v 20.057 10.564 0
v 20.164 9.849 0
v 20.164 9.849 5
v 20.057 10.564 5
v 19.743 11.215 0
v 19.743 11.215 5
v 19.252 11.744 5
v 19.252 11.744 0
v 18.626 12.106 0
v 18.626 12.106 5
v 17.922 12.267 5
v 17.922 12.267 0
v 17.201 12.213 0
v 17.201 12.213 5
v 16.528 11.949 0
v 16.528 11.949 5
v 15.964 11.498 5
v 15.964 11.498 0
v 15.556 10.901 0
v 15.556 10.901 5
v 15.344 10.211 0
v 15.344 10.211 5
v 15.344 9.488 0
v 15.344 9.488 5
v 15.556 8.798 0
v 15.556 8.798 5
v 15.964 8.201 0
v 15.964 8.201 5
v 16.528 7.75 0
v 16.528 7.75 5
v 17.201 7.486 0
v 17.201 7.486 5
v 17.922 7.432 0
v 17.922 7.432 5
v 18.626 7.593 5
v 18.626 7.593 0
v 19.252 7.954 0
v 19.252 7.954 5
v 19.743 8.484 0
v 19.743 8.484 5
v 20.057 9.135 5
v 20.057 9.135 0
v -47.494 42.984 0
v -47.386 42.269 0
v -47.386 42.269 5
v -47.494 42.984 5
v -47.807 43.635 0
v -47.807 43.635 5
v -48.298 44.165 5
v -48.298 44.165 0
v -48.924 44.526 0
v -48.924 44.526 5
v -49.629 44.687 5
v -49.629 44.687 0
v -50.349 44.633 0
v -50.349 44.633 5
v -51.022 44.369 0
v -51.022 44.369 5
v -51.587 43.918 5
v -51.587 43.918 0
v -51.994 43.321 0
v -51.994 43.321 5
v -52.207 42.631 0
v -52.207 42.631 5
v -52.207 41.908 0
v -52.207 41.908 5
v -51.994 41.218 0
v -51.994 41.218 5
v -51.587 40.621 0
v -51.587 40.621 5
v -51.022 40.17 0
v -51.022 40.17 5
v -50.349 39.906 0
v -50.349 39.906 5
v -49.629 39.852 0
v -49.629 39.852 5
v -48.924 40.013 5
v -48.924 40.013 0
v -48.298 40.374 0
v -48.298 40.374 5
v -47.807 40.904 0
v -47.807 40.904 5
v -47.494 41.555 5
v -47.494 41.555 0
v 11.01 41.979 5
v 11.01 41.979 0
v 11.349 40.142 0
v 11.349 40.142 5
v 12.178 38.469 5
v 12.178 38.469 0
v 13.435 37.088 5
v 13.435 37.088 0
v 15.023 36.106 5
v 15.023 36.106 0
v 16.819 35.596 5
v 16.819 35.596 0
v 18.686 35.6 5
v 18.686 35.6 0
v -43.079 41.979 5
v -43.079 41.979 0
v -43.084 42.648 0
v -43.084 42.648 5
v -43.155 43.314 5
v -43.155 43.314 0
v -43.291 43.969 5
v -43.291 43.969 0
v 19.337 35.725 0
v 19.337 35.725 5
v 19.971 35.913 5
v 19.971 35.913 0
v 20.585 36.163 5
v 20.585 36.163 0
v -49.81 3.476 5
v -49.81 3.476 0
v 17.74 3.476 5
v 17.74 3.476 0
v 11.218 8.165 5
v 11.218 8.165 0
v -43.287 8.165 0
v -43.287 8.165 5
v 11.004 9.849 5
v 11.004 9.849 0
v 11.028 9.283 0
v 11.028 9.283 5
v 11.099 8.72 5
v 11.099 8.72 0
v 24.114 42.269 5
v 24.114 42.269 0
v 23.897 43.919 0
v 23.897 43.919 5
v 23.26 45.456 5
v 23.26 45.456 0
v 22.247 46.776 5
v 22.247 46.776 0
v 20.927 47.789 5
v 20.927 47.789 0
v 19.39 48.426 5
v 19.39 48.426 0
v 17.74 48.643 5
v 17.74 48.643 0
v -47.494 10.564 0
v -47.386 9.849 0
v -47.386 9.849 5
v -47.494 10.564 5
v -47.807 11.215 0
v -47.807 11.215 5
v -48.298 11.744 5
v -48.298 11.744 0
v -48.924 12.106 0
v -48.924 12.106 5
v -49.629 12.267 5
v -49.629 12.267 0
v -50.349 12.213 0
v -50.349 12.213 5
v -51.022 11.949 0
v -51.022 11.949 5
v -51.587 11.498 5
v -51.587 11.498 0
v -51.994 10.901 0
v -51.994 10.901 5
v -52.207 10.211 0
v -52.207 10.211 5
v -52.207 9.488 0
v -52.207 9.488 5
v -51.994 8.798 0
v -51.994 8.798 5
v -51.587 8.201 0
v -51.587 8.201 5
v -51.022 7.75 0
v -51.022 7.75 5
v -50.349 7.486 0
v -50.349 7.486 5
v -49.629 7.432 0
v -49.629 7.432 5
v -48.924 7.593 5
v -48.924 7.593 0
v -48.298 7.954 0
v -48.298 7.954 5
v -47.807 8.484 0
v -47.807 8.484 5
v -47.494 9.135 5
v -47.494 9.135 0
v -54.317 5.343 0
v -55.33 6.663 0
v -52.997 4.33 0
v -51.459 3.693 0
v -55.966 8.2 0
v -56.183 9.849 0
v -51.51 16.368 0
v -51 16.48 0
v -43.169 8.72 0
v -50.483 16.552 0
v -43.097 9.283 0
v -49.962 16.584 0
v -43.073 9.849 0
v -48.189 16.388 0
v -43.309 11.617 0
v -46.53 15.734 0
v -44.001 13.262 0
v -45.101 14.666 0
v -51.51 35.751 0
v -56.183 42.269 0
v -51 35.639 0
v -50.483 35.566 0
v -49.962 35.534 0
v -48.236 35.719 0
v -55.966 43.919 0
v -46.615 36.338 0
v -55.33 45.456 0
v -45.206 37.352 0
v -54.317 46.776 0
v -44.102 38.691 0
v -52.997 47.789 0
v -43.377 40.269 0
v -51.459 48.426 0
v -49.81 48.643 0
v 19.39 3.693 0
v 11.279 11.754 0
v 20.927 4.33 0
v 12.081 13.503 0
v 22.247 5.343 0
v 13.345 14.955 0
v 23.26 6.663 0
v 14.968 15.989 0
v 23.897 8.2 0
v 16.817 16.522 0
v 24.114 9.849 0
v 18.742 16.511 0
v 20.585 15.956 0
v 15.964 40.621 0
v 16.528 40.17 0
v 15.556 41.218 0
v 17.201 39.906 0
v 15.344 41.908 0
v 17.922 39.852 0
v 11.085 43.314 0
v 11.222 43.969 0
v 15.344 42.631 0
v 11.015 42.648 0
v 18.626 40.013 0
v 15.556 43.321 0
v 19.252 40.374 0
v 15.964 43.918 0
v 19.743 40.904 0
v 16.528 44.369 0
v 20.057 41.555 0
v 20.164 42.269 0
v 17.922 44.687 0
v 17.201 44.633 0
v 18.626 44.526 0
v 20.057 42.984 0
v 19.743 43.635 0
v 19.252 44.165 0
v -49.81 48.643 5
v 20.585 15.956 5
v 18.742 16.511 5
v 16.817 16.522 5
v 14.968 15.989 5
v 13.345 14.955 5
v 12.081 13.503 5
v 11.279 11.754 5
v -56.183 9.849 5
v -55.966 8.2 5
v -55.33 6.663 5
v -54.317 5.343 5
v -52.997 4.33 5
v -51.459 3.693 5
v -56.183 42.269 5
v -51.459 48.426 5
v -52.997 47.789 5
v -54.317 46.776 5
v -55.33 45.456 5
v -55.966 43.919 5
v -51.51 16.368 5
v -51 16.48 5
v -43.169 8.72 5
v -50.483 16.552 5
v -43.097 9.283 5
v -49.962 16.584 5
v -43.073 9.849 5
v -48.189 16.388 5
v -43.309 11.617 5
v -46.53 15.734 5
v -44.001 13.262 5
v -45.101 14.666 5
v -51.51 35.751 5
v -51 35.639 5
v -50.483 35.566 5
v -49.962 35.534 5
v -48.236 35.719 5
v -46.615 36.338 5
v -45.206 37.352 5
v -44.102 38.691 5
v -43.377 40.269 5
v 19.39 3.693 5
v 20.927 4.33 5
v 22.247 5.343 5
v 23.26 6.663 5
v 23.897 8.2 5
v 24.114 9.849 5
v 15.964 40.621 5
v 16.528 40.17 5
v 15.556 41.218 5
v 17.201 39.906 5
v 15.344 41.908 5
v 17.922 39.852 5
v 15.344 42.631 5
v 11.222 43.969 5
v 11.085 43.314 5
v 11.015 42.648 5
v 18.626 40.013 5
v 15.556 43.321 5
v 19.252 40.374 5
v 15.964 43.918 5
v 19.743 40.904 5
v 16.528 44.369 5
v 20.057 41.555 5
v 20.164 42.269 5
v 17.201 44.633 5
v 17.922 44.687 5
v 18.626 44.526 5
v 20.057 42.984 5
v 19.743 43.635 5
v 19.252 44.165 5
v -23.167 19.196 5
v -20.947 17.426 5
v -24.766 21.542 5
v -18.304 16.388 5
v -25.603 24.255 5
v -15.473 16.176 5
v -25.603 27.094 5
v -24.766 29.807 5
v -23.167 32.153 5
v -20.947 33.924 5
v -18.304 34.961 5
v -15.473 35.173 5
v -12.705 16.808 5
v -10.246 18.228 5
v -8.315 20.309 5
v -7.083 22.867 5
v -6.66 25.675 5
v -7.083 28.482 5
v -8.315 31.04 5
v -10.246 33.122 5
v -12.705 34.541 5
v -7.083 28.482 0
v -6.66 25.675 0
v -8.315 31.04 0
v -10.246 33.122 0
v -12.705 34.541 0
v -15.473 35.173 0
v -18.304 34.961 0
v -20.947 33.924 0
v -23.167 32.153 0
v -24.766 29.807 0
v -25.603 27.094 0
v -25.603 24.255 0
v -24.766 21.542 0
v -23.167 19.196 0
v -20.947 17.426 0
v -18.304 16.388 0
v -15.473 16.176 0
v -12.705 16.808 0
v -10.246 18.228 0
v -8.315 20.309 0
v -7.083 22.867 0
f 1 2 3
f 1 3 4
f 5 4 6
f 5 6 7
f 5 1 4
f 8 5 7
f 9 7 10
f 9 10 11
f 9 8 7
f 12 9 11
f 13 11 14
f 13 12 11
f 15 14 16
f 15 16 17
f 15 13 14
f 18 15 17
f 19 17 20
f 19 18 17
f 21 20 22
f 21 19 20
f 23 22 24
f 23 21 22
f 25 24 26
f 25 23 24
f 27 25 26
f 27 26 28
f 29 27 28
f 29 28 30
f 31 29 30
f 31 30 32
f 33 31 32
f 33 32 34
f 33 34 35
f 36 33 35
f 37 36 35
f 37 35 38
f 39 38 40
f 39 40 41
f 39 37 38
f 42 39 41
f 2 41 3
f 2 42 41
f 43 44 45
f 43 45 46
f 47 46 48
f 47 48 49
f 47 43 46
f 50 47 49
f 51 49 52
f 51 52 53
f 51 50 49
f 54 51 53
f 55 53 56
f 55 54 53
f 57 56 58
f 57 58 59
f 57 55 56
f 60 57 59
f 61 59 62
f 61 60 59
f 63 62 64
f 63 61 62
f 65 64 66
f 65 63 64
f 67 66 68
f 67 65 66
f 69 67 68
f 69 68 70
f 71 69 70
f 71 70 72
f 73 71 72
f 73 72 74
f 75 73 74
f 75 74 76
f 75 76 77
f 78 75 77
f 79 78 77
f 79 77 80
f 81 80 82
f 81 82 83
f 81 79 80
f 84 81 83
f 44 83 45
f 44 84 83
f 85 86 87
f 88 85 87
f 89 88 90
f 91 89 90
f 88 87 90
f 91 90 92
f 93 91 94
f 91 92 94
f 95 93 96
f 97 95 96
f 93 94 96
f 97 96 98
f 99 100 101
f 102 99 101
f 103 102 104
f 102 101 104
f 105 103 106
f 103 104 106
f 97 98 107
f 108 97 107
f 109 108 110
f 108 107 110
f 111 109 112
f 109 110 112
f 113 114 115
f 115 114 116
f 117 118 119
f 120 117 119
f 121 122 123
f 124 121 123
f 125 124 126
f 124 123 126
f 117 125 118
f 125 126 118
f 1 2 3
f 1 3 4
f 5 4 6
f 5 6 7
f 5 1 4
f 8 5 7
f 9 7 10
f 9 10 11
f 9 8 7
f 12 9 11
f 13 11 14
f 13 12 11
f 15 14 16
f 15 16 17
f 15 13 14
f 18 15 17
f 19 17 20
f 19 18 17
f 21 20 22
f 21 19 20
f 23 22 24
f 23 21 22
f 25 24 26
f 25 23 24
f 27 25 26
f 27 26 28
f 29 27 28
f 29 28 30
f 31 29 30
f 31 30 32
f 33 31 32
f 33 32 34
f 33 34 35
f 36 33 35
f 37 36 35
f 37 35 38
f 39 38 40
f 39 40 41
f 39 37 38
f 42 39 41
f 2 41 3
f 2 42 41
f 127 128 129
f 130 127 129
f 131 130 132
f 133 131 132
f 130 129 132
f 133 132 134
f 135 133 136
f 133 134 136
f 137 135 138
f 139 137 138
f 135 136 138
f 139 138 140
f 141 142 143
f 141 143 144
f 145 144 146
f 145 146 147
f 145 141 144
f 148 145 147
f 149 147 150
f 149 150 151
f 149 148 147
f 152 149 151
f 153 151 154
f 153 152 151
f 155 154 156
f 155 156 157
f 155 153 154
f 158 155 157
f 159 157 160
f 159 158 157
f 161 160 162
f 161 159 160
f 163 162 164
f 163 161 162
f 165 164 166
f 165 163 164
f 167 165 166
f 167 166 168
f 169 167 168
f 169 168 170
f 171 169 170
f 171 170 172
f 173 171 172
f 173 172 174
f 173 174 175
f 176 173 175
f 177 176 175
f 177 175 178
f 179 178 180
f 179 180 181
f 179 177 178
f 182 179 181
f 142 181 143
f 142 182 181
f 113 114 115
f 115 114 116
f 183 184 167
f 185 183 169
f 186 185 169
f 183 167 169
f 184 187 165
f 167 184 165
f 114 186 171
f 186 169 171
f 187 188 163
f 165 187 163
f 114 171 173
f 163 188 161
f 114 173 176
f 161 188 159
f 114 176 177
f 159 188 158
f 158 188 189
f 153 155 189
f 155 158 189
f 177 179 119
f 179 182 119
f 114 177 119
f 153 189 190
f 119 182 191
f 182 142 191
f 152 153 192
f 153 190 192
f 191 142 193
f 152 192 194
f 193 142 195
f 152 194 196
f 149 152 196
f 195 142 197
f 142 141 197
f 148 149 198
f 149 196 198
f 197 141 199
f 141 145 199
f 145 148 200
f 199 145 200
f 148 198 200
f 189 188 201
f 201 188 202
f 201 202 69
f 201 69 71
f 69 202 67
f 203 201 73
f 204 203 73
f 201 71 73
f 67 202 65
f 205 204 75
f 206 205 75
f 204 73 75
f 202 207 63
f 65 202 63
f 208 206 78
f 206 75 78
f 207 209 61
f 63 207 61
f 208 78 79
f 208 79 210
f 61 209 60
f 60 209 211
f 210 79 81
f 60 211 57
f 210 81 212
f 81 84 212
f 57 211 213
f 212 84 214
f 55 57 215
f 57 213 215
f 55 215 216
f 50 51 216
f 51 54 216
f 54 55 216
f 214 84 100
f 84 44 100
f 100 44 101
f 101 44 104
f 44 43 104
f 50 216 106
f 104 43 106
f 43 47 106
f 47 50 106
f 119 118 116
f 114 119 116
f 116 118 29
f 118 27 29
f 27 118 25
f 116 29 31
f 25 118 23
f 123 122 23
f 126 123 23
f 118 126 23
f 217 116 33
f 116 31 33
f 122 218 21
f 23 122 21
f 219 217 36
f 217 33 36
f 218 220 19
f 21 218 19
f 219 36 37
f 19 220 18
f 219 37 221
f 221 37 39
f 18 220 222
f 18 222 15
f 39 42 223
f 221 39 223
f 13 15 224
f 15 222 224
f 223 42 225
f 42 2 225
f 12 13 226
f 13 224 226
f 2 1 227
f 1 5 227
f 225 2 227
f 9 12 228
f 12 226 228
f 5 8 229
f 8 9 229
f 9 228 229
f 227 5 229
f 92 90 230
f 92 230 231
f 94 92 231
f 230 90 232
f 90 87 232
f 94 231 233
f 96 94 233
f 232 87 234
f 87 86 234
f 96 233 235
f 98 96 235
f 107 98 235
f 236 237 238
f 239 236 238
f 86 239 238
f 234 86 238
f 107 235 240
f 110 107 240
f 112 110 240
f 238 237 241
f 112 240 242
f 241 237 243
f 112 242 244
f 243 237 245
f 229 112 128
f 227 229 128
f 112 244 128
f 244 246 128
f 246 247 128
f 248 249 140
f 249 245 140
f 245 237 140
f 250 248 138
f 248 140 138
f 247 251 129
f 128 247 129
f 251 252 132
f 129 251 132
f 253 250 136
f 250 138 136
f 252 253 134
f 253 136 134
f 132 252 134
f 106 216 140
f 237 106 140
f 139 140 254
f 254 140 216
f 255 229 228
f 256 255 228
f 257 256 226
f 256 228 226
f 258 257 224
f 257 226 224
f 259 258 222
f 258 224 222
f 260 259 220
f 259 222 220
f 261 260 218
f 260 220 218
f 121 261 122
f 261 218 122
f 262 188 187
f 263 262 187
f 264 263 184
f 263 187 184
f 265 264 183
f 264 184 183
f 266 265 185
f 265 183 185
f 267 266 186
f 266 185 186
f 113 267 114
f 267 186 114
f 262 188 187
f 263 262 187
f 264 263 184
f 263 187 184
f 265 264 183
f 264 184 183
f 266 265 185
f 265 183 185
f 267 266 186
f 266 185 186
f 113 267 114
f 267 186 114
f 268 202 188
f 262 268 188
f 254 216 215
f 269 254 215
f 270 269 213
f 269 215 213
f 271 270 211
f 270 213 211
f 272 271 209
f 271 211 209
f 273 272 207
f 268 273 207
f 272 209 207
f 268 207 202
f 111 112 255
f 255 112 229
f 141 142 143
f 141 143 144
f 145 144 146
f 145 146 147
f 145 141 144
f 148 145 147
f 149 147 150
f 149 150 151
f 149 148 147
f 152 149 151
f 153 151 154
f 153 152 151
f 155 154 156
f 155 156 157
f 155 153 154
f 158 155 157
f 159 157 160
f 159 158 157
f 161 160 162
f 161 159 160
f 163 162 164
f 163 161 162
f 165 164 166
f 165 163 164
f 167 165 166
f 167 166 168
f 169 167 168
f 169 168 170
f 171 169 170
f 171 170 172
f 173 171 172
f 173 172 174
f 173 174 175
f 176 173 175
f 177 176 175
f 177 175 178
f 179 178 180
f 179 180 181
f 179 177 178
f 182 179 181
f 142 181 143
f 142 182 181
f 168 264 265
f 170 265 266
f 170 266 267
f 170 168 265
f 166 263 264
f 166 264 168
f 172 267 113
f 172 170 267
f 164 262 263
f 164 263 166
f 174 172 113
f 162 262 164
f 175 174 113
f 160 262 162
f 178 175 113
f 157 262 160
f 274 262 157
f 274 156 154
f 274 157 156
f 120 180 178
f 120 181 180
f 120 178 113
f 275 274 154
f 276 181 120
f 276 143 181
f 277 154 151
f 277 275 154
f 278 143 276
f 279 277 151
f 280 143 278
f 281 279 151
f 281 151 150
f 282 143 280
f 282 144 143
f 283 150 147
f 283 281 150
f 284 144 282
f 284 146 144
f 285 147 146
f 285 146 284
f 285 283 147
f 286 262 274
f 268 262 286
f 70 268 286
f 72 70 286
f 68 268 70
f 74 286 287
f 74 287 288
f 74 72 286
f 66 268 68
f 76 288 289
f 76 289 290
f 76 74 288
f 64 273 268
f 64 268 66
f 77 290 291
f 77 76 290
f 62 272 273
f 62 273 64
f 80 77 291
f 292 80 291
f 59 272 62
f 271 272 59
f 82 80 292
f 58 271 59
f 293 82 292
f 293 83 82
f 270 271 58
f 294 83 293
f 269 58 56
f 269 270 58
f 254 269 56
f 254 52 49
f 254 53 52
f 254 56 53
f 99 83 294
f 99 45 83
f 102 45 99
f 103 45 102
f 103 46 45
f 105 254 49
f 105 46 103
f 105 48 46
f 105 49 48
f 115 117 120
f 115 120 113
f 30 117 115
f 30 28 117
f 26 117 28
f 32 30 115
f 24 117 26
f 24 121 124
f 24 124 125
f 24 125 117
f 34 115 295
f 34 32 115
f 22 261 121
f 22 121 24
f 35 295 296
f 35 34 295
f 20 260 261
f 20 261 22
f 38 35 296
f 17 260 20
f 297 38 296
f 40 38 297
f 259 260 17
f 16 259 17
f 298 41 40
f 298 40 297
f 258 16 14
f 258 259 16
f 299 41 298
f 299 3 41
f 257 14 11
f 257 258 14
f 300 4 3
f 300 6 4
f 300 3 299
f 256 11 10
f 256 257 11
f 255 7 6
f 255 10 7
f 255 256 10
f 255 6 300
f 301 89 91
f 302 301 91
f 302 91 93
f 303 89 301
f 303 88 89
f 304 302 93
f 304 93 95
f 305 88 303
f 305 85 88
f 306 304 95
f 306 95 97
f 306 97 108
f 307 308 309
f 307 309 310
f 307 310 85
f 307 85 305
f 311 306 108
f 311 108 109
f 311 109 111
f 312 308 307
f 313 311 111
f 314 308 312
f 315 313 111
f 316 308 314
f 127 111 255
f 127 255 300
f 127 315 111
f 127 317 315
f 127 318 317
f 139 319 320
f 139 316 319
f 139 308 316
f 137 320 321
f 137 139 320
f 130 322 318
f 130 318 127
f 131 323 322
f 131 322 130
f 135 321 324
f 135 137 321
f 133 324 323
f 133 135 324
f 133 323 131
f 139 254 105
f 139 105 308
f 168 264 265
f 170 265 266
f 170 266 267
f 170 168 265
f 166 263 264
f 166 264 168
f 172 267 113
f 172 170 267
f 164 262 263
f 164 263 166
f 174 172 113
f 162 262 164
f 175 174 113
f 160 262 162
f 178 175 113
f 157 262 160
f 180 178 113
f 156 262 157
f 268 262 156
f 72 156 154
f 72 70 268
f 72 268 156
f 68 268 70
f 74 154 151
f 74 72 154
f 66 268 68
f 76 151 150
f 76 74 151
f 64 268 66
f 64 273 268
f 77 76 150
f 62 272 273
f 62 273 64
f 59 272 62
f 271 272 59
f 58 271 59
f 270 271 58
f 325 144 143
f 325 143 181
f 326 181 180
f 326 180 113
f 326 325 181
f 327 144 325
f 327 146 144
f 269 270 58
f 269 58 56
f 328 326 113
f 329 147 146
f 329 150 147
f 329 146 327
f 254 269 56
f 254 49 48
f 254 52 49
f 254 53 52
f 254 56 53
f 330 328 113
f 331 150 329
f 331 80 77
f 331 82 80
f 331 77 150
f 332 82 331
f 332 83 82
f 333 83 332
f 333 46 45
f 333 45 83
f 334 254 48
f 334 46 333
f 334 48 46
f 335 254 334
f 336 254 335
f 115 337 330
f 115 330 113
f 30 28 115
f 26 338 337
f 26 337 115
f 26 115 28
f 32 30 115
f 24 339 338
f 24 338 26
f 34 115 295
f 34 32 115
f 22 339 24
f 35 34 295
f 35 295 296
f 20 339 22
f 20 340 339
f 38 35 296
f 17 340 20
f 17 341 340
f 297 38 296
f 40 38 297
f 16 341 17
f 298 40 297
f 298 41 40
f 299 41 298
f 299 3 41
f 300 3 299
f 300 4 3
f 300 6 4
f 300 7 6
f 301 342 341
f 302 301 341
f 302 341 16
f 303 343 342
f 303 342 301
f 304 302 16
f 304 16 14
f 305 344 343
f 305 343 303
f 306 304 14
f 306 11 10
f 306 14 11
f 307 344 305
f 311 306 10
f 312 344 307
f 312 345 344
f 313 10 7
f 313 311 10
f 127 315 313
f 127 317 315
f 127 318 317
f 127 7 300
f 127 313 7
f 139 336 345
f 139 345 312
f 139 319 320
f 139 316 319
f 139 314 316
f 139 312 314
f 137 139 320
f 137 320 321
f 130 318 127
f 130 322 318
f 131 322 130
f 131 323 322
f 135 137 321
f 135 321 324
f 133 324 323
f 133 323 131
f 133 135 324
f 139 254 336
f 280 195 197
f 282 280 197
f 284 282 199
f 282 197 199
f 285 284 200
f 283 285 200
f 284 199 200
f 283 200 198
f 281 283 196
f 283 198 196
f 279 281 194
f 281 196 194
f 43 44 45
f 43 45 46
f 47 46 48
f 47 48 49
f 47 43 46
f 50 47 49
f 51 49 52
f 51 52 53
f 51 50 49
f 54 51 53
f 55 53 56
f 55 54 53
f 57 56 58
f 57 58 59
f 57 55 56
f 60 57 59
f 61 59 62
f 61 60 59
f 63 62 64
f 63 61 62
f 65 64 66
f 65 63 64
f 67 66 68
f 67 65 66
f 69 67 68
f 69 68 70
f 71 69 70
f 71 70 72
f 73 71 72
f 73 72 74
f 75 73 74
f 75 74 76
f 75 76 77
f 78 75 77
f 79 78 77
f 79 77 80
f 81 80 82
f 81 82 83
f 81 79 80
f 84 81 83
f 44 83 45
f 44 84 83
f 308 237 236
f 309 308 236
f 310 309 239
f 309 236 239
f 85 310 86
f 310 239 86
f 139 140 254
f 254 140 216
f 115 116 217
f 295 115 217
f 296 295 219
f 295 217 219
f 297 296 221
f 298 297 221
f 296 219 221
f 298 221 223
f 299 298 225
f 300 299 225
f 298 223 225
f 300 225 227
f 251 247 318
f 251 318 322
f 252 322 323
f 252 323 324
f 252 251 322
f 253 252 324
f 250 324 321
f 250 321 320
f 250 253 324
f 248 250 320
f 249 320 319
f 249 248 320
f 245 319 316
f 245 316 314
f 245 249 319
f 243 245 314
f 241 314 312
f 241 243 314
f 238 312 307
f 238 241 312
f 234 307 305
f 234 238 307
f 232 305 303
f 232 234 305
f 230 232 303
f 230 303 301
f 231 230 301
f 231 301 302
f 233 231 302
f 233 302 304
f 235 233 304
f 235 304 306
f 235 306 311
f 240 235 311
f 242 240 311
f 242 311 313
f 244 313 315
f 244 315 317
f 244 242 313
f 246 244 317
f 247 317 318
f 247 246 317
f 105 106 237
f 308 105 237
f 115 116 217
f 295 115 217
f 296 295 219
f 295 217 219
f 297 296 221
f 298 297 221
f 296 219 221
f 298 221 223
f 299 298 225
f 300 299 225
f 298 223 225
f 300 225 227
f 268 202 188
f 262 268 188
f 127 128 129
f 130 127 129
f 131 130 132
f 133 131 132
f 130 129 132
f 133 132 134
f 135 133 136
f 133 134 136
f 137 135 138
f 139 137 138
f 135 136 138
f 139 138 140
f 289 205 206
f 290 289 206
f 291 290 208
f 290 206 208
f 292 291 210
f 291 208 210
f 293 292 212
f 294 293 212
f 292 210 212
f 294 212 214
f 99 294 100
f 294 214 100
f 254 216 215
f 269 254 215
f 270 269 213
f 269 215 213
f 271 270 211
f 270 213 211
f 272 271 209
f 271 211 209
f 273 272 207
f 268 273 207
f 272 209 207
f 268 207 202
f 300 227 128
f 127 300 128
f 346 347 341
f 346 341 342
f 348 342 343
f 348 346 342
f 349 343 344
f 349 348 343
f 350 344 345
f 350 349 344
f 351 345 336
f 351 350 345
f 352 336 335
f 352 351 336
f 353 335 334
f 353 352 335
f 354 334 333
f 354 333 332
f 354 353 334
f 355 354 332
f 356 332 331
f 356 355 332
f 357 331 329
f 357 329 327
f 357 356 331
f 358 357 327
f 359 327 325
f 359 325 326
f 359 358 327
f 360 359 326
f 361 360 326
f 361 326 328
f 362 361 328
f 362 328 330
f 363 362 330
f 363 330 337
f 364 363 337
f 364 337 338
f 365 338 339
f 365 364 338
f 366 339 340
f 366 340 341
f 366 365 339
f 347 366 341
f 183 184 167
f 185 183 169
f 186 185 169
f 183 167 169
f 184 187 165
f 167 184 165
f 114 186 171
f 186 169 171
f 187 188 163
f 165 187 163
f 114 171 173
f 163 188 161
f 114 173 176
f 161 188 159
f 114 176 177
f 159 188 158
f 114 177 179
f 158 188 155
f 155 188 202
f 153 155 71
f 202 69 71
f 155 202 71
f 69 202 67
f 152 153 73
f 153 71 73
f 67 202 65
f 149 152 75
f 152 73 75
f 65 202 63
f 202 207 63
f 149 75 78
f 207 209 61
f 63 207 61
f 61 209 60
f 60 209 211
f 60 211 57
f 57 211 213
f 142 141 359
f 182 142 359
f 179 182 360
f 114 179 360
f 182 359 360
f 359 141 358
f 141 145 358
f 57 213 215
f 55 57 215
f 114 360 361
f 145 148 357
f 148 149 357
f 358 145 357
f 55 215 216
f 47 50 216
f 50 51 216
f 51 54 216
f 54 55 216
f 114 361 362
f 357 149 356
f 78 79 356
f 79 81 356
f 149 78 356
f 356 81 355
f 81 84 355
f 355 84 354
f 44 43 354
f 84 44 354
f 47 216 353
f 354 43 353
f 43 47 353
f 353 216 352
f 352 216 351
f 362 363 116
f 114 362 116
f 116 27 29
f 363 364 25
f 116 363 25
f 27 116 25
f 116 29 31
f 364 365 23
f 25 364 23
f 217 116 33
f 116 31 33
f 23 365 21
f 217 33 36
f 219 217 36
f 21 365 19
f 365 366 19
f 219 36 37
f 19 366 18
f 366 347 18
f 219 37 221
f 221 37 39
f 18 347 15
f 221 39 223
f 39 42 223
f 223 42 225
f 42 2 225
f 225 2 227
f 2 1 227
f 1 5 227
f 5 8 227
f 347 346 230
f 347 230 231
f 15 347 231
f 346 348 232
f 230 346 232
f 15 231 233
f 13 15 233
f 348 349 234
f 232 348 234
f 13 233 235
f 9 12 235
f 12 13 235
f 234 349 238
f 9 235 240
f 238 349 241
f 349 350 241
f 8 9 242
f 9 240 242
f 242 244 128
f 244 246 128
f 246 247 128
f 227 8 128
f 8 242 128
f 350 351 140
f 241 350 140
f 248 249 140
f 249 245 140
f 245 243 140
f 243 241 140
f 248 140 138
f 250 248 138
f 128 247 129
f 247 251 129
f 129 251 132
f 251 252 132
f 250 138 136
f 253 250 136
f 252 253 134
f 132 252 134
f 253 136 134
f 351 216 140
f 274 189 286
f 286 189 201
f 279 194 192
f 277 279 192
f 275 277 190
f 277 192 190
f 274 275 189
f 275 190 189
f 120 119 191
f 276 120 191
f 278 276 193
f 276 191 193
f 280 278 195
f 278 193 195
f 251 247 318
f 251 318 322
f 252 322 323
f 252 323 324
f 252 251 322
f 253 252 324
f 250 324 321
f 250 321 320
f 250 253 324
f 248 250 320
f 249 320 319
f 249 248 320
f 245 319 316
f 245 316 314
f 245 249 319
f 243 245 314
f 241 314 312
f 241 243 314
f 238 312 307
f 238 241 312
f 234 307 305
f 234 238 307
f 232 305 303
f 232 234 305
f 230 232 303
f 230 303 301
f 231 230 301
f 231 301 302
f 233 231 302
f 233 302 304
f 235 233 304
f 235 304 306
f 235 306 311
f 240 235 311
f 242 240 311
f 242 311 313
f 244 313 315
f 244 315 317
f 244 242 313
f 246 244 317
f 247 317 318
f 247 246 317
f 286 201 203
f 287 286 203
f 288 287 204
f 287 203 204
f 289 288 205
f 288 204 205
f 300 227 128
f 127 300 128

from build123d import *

# Parameters (mm, degrees)
F0_R     = 2.4239795943
F1_DEPTH = 5
F0_R_2   = 14.985
F0_R_3   = 13.105
F0_R_4   = 9.525
F2_DEPTH = 5


with BuildPart() as f1:
    # F0 (on Top) → F1 (new body)
    with BuildSketch(Plane.XY):
        with BuildLine():
            Line((17.7404159275, 48.6430391774), (-49.8098228694, 48.6430391774))
            ThreePointArc((-49.8098228694, 48.6430391774), (-54.3166463867, 46.7762517533), (-56.1834338108, 42.2694282359))
            Line((-56.1834338108, 42.2694282359), (-56.1834338108, 9.8493284865))
            ThreePointArc((-56.1834338108, 9.8493284865), (-54.3166463867, 5.3425049691), (-49.8098228694, 3.475717545))
            Line((-49.8098228694, 3.475717545), (17.7404159275, 3.475717545))
            ThreePointArc((17.7404159275, 3.475717545), (22.2472394449, 5.3425049691), (24.114026869, 9.8493284865))
            Line((24.114026869, 9.8493284865), (24.114026869, 42.2694282359))
            ThreePointArc((24.114026869, 42.2694282359), (22.2472394449, 46.7762517533), (17.7404159275, 48.6430391774))
        make_face()
        with Locations((-49.8098228694, 9.8493301855)):
            Circle(F0_R, mode=Mode.SUBTRACT)
        with Locations((17.7404159273, 9.8493284865)):
            Circle(F0_R, mode=Mode.SUBTRACT)
        with Locations((-49.8098201772, 42.2694282359)):
            Circle(F0_R, mode=Mode.SUBTRACT)
        with BuildLine():
            ThreePointArc((18.6863742083, 35.5996759781), (19.6563634016, 35.8111329866), (20.5847411662, 36.1628542221))
            Line((20.5847411662, 36.1628542221), (20.5847411662, 33.96608295))
            Line((20.5847411662, 33.96608295), (20.5847411662, 18.1526737723))
            Line((20.5847411662, 18.1526737723), (20.5847411662, 16.1657168497))
            Line((20.5847411662, 16.1657168497), (20.5847411662, 15.9559025003))
            ThreePointArc((20.5847411662, 15.9559025003), (14.119667658, 15.5300515231), (11.0039159275, 9.8493283582))
            ThreePointArc((11.0039159275, 9.8493283582), (11.0576244735, 9.0003699293), (11.2178936678, 8.1649485943))
            Line((11.2178936678, 8.1649485943), (9.1265553889, 8.1649485943))
            Line((9.1265553889, 8.1649485943), (-41.1959623307, 8.1649485943))
            Line((-41.1959623307, 8.1649485943), (-43.2873006096, 8.1649485943))
            ThreePointArc((-43.2873006096, 8.1649485943), (-43.1270314153, 9.0003699293), (-43.0733228694, 9.8493283582))
            ThreePointArc((-43.0733228694, 9.8493283582), (-45.1006810771, 14.6664246896), (-49.9624837875, 16.5840984821))
            ThreePointArc((-49.9624837875, 16.5840984821), (-50.7424459789, 16.5209584511), (-51.5098240912, 16.3677967188))
            Line((-51.5098240912, 16.3677967188), (-51.5098240912, 18.4601196723))
            Line((-51.5098240912, 18.4601196723), (-51.5098240912, 33.6587008899))
            Line((-51.5098240912, 33.6587008899), (-51.5098240912, 35.7507176035))
            ThreePointArc((-51.5098240912, 35.7507176035), (-50.7424455275, 35.5975613727), (-49.9624837875, 35.5344236251))
            ThreePointArc((-49.9624837875, 35.5344236251), (-45.2055520994, 37.3516763979), (-43.0793609271, 41.9787832503))
            ThreePointArc((-43.0793609271, 41.9787832503), (-43.1108817874, 42.9820156644), (-43.2911122152, 43.9694293742))
            Line((-43.2911122152, 43.9694293742), (-41.1990955068, 43.9694293742))
            Line((-41.1990955068, 43.9694293742), (9.1296247252, 43.9694293742))
            Line((9.1296247252, 43.9694293742), (11.2219476734, 43.9694293742))
            ThreePointArc((11.2219476734, 43.9694293742), (11.041710784, 42.982016231), (11.0101887588, 41.9787832503))
            ThreePointArc((11.0101887588, 41.9787832503), (13.4348736807, 37.0884304352), (18.6863742083, 35.5996759781))
        make_face(mode=Mode.SUBTRACT)
        with Locations((17.7404159273, 42.2694282359)):
            Circle(F0_R, mode=Mode.SUBTRACT)
    extrude(amount=F1_DEPTH)


with BuildPart() as f2:
    # F0 (on Top) → F2 (new body)
    with BuildSketch(Plane.XY):
        with BuildLine():
            Line((17.7404159275, 48.6430391774), (-49.8098228694, 48.6430391774))
            ThreePointArc((-49.8098228694, 48.6430391774), (-54.3166463867, 46.7762517533), (-56.1834338108, 42.2694282359))
            Line((-56.1834338108, 42.2694282359), (-56.1834338108, 9.8493284865))
            ThreePointArc((-56.1834338108, 9.8493284865), (-54.3166463867, 5.3425049691), (-49.8098228694, 3.475717545))
            Line((-49.8098228694, 3.475717545), (17.7404159275, 3.475717545))
            ThreePointArc((17.7404159275, 3.475717545), (22.2472394449, 5.3425049691), (24.114026869, 9.8493284865))
            Line((24.114026869, 9.8493284865), (24.114026869, 42.2694282359))
            ThreePointArc((24.114026869, 42.2694282359), (22.2472394449, 46.7762517533), (17.7404159275, 48.6430391774))
        make_face()
        with Locations((-49.8098228694, 9.8493301855)):
            Circle(F0_R, mode=Mode.SUBTRACT)
        with Locations((17.7404159273, 9.8493284865)):
            Circle(F0_R, mode=Mode.SUBTRACT)
        with Locations((-49.8098201772, 42.2694282359)):
            Circle(F0_R, mode=Mode.SUBTRACT)
        with BuildLine():
            ThreePointArc((18.6863742083, 35.5996759781), (19.6563634016, 35.8111329866), (20.5847411662, 36.1628542221))
            Line((20.5847411662, 36.1628542221), (20.5847411662, 33.96608295))
            Line((20.5847411662, 33.96608295), (20.5847411662, 18.1526737723))
            Line((20.5847411662, 18.1526737723), (20.5847411662, 16.1657168497))
            Line((20.5847411662, 16.1657168497), (20.5847411662, 15.9559025003))
            ThreePointArc((20.5847411662, 15.9559025003), (14.119667658, 15.5300515231), (11.0039159275, 9.8493283582))
            ThreePointArc((11.0039159275, 9.8493283582), (11.0576244735, 9.0003699293), (11.2178936678, 8.1649485943))
            Line((11.2178936678, 8.1649485943), (9.1265553889, 8.1649485943))
            Line((9.1265553889, 8.1649485943), (-41.1959623307, 8.1649485943))
            Line((-41.1959623307, 8.1649485943), (-43.2873006096, 8.1649485943))
            ThreePointArc((-43.2873006096, 8.1649485943), (-43.1270314153, 9.0003699293), (-43.0733228694, 9.8493283582))
            ThreePointArc((-43.0733228694, 9.8493283582), (-45.1006810771, 14.6664246896), (-49.9624837875, 16.5840984821))
            ThreePointArc((-49.9624837875, 16.5840984821), (-50.7424459789, 16.5209584511), (-51.5098240912, 16.3677967188))
            Line((-51.5098240912, 16.3677967188), (-51.5098240912, 18.4601196723))
            Line((-51.5098240912, 18.4601196723), (-51.5098240912, 33.6587008899))
            Line((-51.5098240912, 33.6587008899), (-51.5098240912, 35.7507176035))
            ThreePointArc((-51.5098240912, 35.7507176035), (-50.7424455275, 35.5975613727), (-49.9624837875, 35.5344236251))
            ThreePointArc((-49.9624837875, 35.5344236251), (-45.2055520994, 37.3516763979), (-43.0793609271, 41.9787832503))
            ThreePointArc((-43.0793609271, 41.9787832503), (-43.1108817874, 42.9820156644), (-43.2911122152, 43.9694293742))
            Line((-43.2911122152, 43.9694293742), (-41.1990955068, 43.9694293742))
            Line((-41.1990955068, 43.9694293742), (9.1296247252, 43.9694293742))
            Line((9.1296247252, 43.9694293742), (11.2219476734, 43.9694293742))
            ThreePointArc((11.2219476734, 43.9694293742), (11.041710784, 42.982016231), (11.0101887588, 41.9787832503))
            ThreePointArc((11.0101887588, 41.9787832503), (13.4348736807, 37.0884304352), (18.6863742083, 35.5996759781))
        make_face(mode=Mode.SUBTRACT)
        with Locations((17.7404159273, 42.2694282359)):
            Circle(F0_R, mode=Mode.SUBTRACT)
        with BuildLine():
            Line((18.7836135842, 18.5641129158), (18.6882003436, 33.5437515458))
            ThreePointArc((18.6882003436, 33.5437515458), (11.9877855185, 35.6404786677), (8.9682295129, 41.9787832503))
            Line((8.9682295129, 41.9787832503), (8.1356065594, 41.9787832503))
            Line((8.1356065594, 41.9787832503), (-41.03769912, 41.9787832503))
            ThreePointArc((-41.03769912, 41.9787832503), (-43.7623075869, 35.9084386517), (-49.9624837875, 33.4938186146))
            Line((-49.9624837875, 33.4938186146), (-49.9624837875, 18.6250007481))
            ThreePointArc((-49.9624837875, 18.6250007481), (-43.6577571493, 16.1093457689), (-41.0328228694, 9.8493283582))
            Line((-41.0328228694, 9.8493283582), (8.1356065594, 9.8493283582))
            Line((8.1356065594, 9.8493283582), (8.9634159275, 9.8493283582))
            ThreePointArc((8.9634159275, 9.8493283582), (11.9146291014, 16.4140780519), (18.7836135842, 18.5641129158))
        make_face()
        with Locations((-16.184706682, 25.6746851806)):
            Circle(F0_R_2, mode=Mode.SUBTRACT)
        with Locations((-16.184706682, 25.6746851806)):
            Circle(F0_R_2)
        with Locations((-16.184706682, 25.6746851806)):
            Circle(F0_R_3, mode=Mode.SUBTRACT)
        with Locations((-16.184706682, 25.6746851806)):
            Circle(F0_R_3)
        with Locations((-16.184706682, 25.6746851806)):
            Circle(F0_R_4, mode=Mode.SUBTRACT)
        with BuildLine():
            Line((8.1356065594, 41.9787832503), (8.9682295129, 41.9787832503))
            ThreePointArc((8.9682295129, 41.9787832503), (8.9921220536, 42.978711885), (9.1296247252, 43.9694293742))
            Line((9.1296247252, 43.9694293742), (-41.1990955068, 43.9694293742))
            ThreePointArc((-41.1990955068, 43.9694293742), (-41.0615918372, 42.9787119518), (-41.03769912, 41.9787832503))
            Line((-41.03769912, 41.9787832503), (8.1356065594, 41.9787832503))
        make_face()
        with BuildLine():
            ThreePointArc((9.1265553889, 8.1649485943), (9.0042960013, 9.003197507), (8.9634159275, 9.8493283582))
            Line((8.9634159275, 9.8493283582), (8.1356065594, 9.8493283582))
            Line((8.1356065594, 9.8493283582), (-41.0328228694, 9.8493283582))
            ThreePointArc((-41.0328228694, 9.8493283582), (-41.0737029431, 9.003197507), (-41.1959623307, 8.1649485943))
            Line((-41.1959623307, 8.1649485943), (9.1265553889, 8.1649485943))
        make_face()
        with BuildLine():
            Line((20.5847411662, 16.1657168497), (20.5847411662, 18.1526737723))
            ThreePointArc((20.5847411662, 18.1526737723), (19.6950333089, 18.4059165852), (18.7836135842, 18.5641129158))
            ThreePointArc((18.7836135842, 18.5641129158), (11.9146291014, 16.4140780519), (8.9634159275, 9.8493283582))
            Line((8.9634159275, 9.8493283582), (11.0039159275, 9.8493283582))
            ThreePointArc((11.0039159275, 9.8493283582), (14.119667658, 15.5300515231), (20.5847411662, 15.9559025003))
            Line((20.5847411662, 15.9559025003), (20.5847411662, 16.1657168497))
        make_face()
        with BuildLine():
            Line((20.5847411662, 18.1526737723), (20.5847411662, 33.96608295))
            ThreePointArc((20.5847411662, 33.96608295), (19.6481933942, 33.7022750251), (18.6882003436, 33.5437515458))
            Line((18.6882003436, 33.5437515458), (18.7836135842, 18.5641129158))
            ThreePointArc((18.7836135842, 18.5641129158), (19.6950333089, 18.4059165852), (20.5847411662, 18.1526737723))
        make_face()
        with BuildLine():
            Line((18.6863742083, 33.8304501925), (18.6863742083, 35.5996759781))
            ThreePointArc((18.6863742083, 35.5996759781), (13.4348736807, 37.0884304352), (11.0101887588, 41.9787832503))
            Line((11.0101887588, 41.9787832503), (8.9682295129, 41.9787832503))
            ThreePointArc((8.9682295129, 41.9787832503), (11.9877855185, 35.6404786677), (18.6882003436, 33.5437515458))
            Line((18.6882003436, 33.5437515458), (18.6863742083, 33.8304501925))
        make_face()
        with BuildLine():
            Line((-41.5897783577, 9.8493283582), (-41.0328228694, 9.8493283582))
            ThreePointArc((-41.0328228694, 9.8493283582), (-43.6577571493, 16.1093457689), (-49.9624837875, 18.6250007481))
            Line((-49.9624837875, 18.6250007481), (-49.9624837875, 18.4927576189))
            Line((-49.9624837875, 18.4927576189), (-49.9624837875, 16.5840984821))
            ThreePointArc((-49.9624837875, 16.5840984821), (-45.1006810771, 14.6664246896), (-43.0733228694, 9.8493283582))
            Line((-43.0733228694, 9.8493283582), (-41.5897783577, 9.8493283582))
        make_face()
        with BuildLine():
            ThreePointArc((-49.9624837875, 33.4938186146), (-43.7623075869, 35.9084386517), (-41.03769912, 41.9787832503))
            Line((-41.03769912, 41.9787832503), (-41.5897783577, 41.9787832503))
            Line((-41.5897783577, 41.9787832503), (-43.0793609271, 41.9787832503))
            ThreePointArc((-43.0793609271, 41.9787832503), (-45.2055520994, 37.3516763979), (-49.9624837875, 35.5344236251))
            Line((-49.9624837875, 35.5344236251), (-49.9624837875, 33.8304501925))
            Line((-49.9624837875, 33.8304501925), (-49.9624837875, 33.4938186146))
        make_face()
        with BuildLine():
            Line((-49.9624837875, 18.6250007481), (-49.9624837875, 33.4938186146))
            ThreePointArc((-49.9624837875, 33.4938186146), (-50.7398152308, 33.5419003047), (-51.5098240912, 33.6587008899))
            Line((-51.5098240912, 33.6587008899), (-51.5098240912, 18.4601196723))
            ThreePointArc((-51.5098240912, 18.4601196723), (-50.7398151777, 18.5769194087), (-49.9624837875, 18.6250007481))
        make_face()
        with BuildLine():
            Line((8.9682295129, 41.9787832503), (11.0101887588, 41.9787832503))
            ThreePointArc((11.0101887588, 41.9787832503), (11.041710784, 42.982016231), (11.2219476734, 43.9694293742))
            Line((11.2219476734, 43.9694293742), (9.1296247252, 43.9694293742))
            ThreePointArc((9.1296247252, 43.9694293742), (8.9921220536, 42.978711885), (8.9682295129, 41.9787832503))
        make_face()
        with BuildLine():
            ThreePointArc((-41.03769912, 41.9787832503), (-41.0615918372, 42.9787119518), (-41.1990955068, 43.9694293742))
            Line((-41.1990955068, 43.9694293742), (-43.2911122152, 43.9694293742))
            ThreePointArc((-43.2911122152, 43.9694293742), (-43.1108817874, 42.9820156644), (-43.0793609271, 41.9787832503))
            Line((-43.0793609271, 41.9787832503), (-41.5897783577, 41.9787832503))
            Line((-41.5897783577, 41.9787832503), (-41.03769912, 41.9787832503))
        make_face()
        with BuildLine():
            Line((20.5847411662, 33.96608295), (20.5847411662, 36.1628542221))
            ThreePointArc((20.5847411662, 36.1628542221), (19.6563634016, 35.8111329866), (18.6863742083, 35.5996759781))
            Line((18.6863742083, 35.5996759781), (18.6863742083, 33.8304501925))
            Line((18.6863742083, 33.8304501925), (18.6882003436, 33.5437515458))
            ThreePointArc((18.6882003436, 33.5437515458), (19.6481933942, 33.7022750251), (20.5847411662, 33.96608295))
        make_face()
        with BuildLine():
            Line((-43.2873006096, 8.1649485943), (-41.1959623307, 8.1649485943))
            ThreePointArc((-41.1959623307, 8.1649485943), (-41.0737029431, 9.003197507), (-41.0328228694, 9.8493283582))
            Line((-41.0328228694, 9.8493283582), (-41.5897783577, 9.8493283582))
            Line((-41.5897783577, 9.8493283582), (-43.0733228694, 9.8493283582))
            ThreePointArc((-43.0733228694, 9.8493283582), (-43.1270314153, 9.0003699293), (-43.2873006096, 8.1649485943))
        make_face()
        with BuildLine():
            Line((11.0039159275, 9.8493283582), (8.9634159275, 9.8493283582))
            ThreePointArc((8.9634159275, 9.8493283582), (9.0042960013, 9.003197507), (9.1265553889, 8.1649485943))
            Line((9.1265553889, 8.1649485943), (11.2178936678, 8.1649485943))
            ThreePointArc((11.2178936678, 8.1649485943), (11.0576244735, 9.0003699293), (11.0039159275, 9.8493283582))
        make_face()
        with BuildLine():
            Line((-49.9624837875, 18.4927576189), (-49.9624837875, 18.6250007481))
            ThreePointArc((-49.9624837875, 18.6250007481), (-50.7398151777, 18.5769194087), (-51.5098240912, 18.4601196723))
            Line((-51.5098240912, 18.4601196723), (-51.5098240912, 16.3677967188))
            ThreePointArc((-51.5098240912, 16.3677967188), (-50.7424459789, 16.5209584511), (-49.9624837875, 16.5840984821))
            Line((-49.9624837875, 16.5840984821), (-49.9624837875, 18.4927576189))
        make_face()
        with BuildLine():
            ThreePointArc((-51.5098240912, 33.6587008899), (-50.7398152308, 33.5419003047), (-49.9624837875, 33.4938186146))
            Line((-49.9624837875, 33.4938186146), (-49.9624837875, 33.8304501925))
            Line((-49.9624837875, 33.8304501925), (-49.9624837875, 35.5344236251))
            ThreePointArc((-49.9624837875, 35.5344236251), (-50.7424455275, 35.5975613727), (-51.5098240912, 35.7507176035))
            Line((-51.5098240912, 35.7507176035), (-51.5098240912, 33.6587008899))
        make_face()
    extrude(amount=F2_DEPTH)


solid = Compound([f1.part, f2.part])
